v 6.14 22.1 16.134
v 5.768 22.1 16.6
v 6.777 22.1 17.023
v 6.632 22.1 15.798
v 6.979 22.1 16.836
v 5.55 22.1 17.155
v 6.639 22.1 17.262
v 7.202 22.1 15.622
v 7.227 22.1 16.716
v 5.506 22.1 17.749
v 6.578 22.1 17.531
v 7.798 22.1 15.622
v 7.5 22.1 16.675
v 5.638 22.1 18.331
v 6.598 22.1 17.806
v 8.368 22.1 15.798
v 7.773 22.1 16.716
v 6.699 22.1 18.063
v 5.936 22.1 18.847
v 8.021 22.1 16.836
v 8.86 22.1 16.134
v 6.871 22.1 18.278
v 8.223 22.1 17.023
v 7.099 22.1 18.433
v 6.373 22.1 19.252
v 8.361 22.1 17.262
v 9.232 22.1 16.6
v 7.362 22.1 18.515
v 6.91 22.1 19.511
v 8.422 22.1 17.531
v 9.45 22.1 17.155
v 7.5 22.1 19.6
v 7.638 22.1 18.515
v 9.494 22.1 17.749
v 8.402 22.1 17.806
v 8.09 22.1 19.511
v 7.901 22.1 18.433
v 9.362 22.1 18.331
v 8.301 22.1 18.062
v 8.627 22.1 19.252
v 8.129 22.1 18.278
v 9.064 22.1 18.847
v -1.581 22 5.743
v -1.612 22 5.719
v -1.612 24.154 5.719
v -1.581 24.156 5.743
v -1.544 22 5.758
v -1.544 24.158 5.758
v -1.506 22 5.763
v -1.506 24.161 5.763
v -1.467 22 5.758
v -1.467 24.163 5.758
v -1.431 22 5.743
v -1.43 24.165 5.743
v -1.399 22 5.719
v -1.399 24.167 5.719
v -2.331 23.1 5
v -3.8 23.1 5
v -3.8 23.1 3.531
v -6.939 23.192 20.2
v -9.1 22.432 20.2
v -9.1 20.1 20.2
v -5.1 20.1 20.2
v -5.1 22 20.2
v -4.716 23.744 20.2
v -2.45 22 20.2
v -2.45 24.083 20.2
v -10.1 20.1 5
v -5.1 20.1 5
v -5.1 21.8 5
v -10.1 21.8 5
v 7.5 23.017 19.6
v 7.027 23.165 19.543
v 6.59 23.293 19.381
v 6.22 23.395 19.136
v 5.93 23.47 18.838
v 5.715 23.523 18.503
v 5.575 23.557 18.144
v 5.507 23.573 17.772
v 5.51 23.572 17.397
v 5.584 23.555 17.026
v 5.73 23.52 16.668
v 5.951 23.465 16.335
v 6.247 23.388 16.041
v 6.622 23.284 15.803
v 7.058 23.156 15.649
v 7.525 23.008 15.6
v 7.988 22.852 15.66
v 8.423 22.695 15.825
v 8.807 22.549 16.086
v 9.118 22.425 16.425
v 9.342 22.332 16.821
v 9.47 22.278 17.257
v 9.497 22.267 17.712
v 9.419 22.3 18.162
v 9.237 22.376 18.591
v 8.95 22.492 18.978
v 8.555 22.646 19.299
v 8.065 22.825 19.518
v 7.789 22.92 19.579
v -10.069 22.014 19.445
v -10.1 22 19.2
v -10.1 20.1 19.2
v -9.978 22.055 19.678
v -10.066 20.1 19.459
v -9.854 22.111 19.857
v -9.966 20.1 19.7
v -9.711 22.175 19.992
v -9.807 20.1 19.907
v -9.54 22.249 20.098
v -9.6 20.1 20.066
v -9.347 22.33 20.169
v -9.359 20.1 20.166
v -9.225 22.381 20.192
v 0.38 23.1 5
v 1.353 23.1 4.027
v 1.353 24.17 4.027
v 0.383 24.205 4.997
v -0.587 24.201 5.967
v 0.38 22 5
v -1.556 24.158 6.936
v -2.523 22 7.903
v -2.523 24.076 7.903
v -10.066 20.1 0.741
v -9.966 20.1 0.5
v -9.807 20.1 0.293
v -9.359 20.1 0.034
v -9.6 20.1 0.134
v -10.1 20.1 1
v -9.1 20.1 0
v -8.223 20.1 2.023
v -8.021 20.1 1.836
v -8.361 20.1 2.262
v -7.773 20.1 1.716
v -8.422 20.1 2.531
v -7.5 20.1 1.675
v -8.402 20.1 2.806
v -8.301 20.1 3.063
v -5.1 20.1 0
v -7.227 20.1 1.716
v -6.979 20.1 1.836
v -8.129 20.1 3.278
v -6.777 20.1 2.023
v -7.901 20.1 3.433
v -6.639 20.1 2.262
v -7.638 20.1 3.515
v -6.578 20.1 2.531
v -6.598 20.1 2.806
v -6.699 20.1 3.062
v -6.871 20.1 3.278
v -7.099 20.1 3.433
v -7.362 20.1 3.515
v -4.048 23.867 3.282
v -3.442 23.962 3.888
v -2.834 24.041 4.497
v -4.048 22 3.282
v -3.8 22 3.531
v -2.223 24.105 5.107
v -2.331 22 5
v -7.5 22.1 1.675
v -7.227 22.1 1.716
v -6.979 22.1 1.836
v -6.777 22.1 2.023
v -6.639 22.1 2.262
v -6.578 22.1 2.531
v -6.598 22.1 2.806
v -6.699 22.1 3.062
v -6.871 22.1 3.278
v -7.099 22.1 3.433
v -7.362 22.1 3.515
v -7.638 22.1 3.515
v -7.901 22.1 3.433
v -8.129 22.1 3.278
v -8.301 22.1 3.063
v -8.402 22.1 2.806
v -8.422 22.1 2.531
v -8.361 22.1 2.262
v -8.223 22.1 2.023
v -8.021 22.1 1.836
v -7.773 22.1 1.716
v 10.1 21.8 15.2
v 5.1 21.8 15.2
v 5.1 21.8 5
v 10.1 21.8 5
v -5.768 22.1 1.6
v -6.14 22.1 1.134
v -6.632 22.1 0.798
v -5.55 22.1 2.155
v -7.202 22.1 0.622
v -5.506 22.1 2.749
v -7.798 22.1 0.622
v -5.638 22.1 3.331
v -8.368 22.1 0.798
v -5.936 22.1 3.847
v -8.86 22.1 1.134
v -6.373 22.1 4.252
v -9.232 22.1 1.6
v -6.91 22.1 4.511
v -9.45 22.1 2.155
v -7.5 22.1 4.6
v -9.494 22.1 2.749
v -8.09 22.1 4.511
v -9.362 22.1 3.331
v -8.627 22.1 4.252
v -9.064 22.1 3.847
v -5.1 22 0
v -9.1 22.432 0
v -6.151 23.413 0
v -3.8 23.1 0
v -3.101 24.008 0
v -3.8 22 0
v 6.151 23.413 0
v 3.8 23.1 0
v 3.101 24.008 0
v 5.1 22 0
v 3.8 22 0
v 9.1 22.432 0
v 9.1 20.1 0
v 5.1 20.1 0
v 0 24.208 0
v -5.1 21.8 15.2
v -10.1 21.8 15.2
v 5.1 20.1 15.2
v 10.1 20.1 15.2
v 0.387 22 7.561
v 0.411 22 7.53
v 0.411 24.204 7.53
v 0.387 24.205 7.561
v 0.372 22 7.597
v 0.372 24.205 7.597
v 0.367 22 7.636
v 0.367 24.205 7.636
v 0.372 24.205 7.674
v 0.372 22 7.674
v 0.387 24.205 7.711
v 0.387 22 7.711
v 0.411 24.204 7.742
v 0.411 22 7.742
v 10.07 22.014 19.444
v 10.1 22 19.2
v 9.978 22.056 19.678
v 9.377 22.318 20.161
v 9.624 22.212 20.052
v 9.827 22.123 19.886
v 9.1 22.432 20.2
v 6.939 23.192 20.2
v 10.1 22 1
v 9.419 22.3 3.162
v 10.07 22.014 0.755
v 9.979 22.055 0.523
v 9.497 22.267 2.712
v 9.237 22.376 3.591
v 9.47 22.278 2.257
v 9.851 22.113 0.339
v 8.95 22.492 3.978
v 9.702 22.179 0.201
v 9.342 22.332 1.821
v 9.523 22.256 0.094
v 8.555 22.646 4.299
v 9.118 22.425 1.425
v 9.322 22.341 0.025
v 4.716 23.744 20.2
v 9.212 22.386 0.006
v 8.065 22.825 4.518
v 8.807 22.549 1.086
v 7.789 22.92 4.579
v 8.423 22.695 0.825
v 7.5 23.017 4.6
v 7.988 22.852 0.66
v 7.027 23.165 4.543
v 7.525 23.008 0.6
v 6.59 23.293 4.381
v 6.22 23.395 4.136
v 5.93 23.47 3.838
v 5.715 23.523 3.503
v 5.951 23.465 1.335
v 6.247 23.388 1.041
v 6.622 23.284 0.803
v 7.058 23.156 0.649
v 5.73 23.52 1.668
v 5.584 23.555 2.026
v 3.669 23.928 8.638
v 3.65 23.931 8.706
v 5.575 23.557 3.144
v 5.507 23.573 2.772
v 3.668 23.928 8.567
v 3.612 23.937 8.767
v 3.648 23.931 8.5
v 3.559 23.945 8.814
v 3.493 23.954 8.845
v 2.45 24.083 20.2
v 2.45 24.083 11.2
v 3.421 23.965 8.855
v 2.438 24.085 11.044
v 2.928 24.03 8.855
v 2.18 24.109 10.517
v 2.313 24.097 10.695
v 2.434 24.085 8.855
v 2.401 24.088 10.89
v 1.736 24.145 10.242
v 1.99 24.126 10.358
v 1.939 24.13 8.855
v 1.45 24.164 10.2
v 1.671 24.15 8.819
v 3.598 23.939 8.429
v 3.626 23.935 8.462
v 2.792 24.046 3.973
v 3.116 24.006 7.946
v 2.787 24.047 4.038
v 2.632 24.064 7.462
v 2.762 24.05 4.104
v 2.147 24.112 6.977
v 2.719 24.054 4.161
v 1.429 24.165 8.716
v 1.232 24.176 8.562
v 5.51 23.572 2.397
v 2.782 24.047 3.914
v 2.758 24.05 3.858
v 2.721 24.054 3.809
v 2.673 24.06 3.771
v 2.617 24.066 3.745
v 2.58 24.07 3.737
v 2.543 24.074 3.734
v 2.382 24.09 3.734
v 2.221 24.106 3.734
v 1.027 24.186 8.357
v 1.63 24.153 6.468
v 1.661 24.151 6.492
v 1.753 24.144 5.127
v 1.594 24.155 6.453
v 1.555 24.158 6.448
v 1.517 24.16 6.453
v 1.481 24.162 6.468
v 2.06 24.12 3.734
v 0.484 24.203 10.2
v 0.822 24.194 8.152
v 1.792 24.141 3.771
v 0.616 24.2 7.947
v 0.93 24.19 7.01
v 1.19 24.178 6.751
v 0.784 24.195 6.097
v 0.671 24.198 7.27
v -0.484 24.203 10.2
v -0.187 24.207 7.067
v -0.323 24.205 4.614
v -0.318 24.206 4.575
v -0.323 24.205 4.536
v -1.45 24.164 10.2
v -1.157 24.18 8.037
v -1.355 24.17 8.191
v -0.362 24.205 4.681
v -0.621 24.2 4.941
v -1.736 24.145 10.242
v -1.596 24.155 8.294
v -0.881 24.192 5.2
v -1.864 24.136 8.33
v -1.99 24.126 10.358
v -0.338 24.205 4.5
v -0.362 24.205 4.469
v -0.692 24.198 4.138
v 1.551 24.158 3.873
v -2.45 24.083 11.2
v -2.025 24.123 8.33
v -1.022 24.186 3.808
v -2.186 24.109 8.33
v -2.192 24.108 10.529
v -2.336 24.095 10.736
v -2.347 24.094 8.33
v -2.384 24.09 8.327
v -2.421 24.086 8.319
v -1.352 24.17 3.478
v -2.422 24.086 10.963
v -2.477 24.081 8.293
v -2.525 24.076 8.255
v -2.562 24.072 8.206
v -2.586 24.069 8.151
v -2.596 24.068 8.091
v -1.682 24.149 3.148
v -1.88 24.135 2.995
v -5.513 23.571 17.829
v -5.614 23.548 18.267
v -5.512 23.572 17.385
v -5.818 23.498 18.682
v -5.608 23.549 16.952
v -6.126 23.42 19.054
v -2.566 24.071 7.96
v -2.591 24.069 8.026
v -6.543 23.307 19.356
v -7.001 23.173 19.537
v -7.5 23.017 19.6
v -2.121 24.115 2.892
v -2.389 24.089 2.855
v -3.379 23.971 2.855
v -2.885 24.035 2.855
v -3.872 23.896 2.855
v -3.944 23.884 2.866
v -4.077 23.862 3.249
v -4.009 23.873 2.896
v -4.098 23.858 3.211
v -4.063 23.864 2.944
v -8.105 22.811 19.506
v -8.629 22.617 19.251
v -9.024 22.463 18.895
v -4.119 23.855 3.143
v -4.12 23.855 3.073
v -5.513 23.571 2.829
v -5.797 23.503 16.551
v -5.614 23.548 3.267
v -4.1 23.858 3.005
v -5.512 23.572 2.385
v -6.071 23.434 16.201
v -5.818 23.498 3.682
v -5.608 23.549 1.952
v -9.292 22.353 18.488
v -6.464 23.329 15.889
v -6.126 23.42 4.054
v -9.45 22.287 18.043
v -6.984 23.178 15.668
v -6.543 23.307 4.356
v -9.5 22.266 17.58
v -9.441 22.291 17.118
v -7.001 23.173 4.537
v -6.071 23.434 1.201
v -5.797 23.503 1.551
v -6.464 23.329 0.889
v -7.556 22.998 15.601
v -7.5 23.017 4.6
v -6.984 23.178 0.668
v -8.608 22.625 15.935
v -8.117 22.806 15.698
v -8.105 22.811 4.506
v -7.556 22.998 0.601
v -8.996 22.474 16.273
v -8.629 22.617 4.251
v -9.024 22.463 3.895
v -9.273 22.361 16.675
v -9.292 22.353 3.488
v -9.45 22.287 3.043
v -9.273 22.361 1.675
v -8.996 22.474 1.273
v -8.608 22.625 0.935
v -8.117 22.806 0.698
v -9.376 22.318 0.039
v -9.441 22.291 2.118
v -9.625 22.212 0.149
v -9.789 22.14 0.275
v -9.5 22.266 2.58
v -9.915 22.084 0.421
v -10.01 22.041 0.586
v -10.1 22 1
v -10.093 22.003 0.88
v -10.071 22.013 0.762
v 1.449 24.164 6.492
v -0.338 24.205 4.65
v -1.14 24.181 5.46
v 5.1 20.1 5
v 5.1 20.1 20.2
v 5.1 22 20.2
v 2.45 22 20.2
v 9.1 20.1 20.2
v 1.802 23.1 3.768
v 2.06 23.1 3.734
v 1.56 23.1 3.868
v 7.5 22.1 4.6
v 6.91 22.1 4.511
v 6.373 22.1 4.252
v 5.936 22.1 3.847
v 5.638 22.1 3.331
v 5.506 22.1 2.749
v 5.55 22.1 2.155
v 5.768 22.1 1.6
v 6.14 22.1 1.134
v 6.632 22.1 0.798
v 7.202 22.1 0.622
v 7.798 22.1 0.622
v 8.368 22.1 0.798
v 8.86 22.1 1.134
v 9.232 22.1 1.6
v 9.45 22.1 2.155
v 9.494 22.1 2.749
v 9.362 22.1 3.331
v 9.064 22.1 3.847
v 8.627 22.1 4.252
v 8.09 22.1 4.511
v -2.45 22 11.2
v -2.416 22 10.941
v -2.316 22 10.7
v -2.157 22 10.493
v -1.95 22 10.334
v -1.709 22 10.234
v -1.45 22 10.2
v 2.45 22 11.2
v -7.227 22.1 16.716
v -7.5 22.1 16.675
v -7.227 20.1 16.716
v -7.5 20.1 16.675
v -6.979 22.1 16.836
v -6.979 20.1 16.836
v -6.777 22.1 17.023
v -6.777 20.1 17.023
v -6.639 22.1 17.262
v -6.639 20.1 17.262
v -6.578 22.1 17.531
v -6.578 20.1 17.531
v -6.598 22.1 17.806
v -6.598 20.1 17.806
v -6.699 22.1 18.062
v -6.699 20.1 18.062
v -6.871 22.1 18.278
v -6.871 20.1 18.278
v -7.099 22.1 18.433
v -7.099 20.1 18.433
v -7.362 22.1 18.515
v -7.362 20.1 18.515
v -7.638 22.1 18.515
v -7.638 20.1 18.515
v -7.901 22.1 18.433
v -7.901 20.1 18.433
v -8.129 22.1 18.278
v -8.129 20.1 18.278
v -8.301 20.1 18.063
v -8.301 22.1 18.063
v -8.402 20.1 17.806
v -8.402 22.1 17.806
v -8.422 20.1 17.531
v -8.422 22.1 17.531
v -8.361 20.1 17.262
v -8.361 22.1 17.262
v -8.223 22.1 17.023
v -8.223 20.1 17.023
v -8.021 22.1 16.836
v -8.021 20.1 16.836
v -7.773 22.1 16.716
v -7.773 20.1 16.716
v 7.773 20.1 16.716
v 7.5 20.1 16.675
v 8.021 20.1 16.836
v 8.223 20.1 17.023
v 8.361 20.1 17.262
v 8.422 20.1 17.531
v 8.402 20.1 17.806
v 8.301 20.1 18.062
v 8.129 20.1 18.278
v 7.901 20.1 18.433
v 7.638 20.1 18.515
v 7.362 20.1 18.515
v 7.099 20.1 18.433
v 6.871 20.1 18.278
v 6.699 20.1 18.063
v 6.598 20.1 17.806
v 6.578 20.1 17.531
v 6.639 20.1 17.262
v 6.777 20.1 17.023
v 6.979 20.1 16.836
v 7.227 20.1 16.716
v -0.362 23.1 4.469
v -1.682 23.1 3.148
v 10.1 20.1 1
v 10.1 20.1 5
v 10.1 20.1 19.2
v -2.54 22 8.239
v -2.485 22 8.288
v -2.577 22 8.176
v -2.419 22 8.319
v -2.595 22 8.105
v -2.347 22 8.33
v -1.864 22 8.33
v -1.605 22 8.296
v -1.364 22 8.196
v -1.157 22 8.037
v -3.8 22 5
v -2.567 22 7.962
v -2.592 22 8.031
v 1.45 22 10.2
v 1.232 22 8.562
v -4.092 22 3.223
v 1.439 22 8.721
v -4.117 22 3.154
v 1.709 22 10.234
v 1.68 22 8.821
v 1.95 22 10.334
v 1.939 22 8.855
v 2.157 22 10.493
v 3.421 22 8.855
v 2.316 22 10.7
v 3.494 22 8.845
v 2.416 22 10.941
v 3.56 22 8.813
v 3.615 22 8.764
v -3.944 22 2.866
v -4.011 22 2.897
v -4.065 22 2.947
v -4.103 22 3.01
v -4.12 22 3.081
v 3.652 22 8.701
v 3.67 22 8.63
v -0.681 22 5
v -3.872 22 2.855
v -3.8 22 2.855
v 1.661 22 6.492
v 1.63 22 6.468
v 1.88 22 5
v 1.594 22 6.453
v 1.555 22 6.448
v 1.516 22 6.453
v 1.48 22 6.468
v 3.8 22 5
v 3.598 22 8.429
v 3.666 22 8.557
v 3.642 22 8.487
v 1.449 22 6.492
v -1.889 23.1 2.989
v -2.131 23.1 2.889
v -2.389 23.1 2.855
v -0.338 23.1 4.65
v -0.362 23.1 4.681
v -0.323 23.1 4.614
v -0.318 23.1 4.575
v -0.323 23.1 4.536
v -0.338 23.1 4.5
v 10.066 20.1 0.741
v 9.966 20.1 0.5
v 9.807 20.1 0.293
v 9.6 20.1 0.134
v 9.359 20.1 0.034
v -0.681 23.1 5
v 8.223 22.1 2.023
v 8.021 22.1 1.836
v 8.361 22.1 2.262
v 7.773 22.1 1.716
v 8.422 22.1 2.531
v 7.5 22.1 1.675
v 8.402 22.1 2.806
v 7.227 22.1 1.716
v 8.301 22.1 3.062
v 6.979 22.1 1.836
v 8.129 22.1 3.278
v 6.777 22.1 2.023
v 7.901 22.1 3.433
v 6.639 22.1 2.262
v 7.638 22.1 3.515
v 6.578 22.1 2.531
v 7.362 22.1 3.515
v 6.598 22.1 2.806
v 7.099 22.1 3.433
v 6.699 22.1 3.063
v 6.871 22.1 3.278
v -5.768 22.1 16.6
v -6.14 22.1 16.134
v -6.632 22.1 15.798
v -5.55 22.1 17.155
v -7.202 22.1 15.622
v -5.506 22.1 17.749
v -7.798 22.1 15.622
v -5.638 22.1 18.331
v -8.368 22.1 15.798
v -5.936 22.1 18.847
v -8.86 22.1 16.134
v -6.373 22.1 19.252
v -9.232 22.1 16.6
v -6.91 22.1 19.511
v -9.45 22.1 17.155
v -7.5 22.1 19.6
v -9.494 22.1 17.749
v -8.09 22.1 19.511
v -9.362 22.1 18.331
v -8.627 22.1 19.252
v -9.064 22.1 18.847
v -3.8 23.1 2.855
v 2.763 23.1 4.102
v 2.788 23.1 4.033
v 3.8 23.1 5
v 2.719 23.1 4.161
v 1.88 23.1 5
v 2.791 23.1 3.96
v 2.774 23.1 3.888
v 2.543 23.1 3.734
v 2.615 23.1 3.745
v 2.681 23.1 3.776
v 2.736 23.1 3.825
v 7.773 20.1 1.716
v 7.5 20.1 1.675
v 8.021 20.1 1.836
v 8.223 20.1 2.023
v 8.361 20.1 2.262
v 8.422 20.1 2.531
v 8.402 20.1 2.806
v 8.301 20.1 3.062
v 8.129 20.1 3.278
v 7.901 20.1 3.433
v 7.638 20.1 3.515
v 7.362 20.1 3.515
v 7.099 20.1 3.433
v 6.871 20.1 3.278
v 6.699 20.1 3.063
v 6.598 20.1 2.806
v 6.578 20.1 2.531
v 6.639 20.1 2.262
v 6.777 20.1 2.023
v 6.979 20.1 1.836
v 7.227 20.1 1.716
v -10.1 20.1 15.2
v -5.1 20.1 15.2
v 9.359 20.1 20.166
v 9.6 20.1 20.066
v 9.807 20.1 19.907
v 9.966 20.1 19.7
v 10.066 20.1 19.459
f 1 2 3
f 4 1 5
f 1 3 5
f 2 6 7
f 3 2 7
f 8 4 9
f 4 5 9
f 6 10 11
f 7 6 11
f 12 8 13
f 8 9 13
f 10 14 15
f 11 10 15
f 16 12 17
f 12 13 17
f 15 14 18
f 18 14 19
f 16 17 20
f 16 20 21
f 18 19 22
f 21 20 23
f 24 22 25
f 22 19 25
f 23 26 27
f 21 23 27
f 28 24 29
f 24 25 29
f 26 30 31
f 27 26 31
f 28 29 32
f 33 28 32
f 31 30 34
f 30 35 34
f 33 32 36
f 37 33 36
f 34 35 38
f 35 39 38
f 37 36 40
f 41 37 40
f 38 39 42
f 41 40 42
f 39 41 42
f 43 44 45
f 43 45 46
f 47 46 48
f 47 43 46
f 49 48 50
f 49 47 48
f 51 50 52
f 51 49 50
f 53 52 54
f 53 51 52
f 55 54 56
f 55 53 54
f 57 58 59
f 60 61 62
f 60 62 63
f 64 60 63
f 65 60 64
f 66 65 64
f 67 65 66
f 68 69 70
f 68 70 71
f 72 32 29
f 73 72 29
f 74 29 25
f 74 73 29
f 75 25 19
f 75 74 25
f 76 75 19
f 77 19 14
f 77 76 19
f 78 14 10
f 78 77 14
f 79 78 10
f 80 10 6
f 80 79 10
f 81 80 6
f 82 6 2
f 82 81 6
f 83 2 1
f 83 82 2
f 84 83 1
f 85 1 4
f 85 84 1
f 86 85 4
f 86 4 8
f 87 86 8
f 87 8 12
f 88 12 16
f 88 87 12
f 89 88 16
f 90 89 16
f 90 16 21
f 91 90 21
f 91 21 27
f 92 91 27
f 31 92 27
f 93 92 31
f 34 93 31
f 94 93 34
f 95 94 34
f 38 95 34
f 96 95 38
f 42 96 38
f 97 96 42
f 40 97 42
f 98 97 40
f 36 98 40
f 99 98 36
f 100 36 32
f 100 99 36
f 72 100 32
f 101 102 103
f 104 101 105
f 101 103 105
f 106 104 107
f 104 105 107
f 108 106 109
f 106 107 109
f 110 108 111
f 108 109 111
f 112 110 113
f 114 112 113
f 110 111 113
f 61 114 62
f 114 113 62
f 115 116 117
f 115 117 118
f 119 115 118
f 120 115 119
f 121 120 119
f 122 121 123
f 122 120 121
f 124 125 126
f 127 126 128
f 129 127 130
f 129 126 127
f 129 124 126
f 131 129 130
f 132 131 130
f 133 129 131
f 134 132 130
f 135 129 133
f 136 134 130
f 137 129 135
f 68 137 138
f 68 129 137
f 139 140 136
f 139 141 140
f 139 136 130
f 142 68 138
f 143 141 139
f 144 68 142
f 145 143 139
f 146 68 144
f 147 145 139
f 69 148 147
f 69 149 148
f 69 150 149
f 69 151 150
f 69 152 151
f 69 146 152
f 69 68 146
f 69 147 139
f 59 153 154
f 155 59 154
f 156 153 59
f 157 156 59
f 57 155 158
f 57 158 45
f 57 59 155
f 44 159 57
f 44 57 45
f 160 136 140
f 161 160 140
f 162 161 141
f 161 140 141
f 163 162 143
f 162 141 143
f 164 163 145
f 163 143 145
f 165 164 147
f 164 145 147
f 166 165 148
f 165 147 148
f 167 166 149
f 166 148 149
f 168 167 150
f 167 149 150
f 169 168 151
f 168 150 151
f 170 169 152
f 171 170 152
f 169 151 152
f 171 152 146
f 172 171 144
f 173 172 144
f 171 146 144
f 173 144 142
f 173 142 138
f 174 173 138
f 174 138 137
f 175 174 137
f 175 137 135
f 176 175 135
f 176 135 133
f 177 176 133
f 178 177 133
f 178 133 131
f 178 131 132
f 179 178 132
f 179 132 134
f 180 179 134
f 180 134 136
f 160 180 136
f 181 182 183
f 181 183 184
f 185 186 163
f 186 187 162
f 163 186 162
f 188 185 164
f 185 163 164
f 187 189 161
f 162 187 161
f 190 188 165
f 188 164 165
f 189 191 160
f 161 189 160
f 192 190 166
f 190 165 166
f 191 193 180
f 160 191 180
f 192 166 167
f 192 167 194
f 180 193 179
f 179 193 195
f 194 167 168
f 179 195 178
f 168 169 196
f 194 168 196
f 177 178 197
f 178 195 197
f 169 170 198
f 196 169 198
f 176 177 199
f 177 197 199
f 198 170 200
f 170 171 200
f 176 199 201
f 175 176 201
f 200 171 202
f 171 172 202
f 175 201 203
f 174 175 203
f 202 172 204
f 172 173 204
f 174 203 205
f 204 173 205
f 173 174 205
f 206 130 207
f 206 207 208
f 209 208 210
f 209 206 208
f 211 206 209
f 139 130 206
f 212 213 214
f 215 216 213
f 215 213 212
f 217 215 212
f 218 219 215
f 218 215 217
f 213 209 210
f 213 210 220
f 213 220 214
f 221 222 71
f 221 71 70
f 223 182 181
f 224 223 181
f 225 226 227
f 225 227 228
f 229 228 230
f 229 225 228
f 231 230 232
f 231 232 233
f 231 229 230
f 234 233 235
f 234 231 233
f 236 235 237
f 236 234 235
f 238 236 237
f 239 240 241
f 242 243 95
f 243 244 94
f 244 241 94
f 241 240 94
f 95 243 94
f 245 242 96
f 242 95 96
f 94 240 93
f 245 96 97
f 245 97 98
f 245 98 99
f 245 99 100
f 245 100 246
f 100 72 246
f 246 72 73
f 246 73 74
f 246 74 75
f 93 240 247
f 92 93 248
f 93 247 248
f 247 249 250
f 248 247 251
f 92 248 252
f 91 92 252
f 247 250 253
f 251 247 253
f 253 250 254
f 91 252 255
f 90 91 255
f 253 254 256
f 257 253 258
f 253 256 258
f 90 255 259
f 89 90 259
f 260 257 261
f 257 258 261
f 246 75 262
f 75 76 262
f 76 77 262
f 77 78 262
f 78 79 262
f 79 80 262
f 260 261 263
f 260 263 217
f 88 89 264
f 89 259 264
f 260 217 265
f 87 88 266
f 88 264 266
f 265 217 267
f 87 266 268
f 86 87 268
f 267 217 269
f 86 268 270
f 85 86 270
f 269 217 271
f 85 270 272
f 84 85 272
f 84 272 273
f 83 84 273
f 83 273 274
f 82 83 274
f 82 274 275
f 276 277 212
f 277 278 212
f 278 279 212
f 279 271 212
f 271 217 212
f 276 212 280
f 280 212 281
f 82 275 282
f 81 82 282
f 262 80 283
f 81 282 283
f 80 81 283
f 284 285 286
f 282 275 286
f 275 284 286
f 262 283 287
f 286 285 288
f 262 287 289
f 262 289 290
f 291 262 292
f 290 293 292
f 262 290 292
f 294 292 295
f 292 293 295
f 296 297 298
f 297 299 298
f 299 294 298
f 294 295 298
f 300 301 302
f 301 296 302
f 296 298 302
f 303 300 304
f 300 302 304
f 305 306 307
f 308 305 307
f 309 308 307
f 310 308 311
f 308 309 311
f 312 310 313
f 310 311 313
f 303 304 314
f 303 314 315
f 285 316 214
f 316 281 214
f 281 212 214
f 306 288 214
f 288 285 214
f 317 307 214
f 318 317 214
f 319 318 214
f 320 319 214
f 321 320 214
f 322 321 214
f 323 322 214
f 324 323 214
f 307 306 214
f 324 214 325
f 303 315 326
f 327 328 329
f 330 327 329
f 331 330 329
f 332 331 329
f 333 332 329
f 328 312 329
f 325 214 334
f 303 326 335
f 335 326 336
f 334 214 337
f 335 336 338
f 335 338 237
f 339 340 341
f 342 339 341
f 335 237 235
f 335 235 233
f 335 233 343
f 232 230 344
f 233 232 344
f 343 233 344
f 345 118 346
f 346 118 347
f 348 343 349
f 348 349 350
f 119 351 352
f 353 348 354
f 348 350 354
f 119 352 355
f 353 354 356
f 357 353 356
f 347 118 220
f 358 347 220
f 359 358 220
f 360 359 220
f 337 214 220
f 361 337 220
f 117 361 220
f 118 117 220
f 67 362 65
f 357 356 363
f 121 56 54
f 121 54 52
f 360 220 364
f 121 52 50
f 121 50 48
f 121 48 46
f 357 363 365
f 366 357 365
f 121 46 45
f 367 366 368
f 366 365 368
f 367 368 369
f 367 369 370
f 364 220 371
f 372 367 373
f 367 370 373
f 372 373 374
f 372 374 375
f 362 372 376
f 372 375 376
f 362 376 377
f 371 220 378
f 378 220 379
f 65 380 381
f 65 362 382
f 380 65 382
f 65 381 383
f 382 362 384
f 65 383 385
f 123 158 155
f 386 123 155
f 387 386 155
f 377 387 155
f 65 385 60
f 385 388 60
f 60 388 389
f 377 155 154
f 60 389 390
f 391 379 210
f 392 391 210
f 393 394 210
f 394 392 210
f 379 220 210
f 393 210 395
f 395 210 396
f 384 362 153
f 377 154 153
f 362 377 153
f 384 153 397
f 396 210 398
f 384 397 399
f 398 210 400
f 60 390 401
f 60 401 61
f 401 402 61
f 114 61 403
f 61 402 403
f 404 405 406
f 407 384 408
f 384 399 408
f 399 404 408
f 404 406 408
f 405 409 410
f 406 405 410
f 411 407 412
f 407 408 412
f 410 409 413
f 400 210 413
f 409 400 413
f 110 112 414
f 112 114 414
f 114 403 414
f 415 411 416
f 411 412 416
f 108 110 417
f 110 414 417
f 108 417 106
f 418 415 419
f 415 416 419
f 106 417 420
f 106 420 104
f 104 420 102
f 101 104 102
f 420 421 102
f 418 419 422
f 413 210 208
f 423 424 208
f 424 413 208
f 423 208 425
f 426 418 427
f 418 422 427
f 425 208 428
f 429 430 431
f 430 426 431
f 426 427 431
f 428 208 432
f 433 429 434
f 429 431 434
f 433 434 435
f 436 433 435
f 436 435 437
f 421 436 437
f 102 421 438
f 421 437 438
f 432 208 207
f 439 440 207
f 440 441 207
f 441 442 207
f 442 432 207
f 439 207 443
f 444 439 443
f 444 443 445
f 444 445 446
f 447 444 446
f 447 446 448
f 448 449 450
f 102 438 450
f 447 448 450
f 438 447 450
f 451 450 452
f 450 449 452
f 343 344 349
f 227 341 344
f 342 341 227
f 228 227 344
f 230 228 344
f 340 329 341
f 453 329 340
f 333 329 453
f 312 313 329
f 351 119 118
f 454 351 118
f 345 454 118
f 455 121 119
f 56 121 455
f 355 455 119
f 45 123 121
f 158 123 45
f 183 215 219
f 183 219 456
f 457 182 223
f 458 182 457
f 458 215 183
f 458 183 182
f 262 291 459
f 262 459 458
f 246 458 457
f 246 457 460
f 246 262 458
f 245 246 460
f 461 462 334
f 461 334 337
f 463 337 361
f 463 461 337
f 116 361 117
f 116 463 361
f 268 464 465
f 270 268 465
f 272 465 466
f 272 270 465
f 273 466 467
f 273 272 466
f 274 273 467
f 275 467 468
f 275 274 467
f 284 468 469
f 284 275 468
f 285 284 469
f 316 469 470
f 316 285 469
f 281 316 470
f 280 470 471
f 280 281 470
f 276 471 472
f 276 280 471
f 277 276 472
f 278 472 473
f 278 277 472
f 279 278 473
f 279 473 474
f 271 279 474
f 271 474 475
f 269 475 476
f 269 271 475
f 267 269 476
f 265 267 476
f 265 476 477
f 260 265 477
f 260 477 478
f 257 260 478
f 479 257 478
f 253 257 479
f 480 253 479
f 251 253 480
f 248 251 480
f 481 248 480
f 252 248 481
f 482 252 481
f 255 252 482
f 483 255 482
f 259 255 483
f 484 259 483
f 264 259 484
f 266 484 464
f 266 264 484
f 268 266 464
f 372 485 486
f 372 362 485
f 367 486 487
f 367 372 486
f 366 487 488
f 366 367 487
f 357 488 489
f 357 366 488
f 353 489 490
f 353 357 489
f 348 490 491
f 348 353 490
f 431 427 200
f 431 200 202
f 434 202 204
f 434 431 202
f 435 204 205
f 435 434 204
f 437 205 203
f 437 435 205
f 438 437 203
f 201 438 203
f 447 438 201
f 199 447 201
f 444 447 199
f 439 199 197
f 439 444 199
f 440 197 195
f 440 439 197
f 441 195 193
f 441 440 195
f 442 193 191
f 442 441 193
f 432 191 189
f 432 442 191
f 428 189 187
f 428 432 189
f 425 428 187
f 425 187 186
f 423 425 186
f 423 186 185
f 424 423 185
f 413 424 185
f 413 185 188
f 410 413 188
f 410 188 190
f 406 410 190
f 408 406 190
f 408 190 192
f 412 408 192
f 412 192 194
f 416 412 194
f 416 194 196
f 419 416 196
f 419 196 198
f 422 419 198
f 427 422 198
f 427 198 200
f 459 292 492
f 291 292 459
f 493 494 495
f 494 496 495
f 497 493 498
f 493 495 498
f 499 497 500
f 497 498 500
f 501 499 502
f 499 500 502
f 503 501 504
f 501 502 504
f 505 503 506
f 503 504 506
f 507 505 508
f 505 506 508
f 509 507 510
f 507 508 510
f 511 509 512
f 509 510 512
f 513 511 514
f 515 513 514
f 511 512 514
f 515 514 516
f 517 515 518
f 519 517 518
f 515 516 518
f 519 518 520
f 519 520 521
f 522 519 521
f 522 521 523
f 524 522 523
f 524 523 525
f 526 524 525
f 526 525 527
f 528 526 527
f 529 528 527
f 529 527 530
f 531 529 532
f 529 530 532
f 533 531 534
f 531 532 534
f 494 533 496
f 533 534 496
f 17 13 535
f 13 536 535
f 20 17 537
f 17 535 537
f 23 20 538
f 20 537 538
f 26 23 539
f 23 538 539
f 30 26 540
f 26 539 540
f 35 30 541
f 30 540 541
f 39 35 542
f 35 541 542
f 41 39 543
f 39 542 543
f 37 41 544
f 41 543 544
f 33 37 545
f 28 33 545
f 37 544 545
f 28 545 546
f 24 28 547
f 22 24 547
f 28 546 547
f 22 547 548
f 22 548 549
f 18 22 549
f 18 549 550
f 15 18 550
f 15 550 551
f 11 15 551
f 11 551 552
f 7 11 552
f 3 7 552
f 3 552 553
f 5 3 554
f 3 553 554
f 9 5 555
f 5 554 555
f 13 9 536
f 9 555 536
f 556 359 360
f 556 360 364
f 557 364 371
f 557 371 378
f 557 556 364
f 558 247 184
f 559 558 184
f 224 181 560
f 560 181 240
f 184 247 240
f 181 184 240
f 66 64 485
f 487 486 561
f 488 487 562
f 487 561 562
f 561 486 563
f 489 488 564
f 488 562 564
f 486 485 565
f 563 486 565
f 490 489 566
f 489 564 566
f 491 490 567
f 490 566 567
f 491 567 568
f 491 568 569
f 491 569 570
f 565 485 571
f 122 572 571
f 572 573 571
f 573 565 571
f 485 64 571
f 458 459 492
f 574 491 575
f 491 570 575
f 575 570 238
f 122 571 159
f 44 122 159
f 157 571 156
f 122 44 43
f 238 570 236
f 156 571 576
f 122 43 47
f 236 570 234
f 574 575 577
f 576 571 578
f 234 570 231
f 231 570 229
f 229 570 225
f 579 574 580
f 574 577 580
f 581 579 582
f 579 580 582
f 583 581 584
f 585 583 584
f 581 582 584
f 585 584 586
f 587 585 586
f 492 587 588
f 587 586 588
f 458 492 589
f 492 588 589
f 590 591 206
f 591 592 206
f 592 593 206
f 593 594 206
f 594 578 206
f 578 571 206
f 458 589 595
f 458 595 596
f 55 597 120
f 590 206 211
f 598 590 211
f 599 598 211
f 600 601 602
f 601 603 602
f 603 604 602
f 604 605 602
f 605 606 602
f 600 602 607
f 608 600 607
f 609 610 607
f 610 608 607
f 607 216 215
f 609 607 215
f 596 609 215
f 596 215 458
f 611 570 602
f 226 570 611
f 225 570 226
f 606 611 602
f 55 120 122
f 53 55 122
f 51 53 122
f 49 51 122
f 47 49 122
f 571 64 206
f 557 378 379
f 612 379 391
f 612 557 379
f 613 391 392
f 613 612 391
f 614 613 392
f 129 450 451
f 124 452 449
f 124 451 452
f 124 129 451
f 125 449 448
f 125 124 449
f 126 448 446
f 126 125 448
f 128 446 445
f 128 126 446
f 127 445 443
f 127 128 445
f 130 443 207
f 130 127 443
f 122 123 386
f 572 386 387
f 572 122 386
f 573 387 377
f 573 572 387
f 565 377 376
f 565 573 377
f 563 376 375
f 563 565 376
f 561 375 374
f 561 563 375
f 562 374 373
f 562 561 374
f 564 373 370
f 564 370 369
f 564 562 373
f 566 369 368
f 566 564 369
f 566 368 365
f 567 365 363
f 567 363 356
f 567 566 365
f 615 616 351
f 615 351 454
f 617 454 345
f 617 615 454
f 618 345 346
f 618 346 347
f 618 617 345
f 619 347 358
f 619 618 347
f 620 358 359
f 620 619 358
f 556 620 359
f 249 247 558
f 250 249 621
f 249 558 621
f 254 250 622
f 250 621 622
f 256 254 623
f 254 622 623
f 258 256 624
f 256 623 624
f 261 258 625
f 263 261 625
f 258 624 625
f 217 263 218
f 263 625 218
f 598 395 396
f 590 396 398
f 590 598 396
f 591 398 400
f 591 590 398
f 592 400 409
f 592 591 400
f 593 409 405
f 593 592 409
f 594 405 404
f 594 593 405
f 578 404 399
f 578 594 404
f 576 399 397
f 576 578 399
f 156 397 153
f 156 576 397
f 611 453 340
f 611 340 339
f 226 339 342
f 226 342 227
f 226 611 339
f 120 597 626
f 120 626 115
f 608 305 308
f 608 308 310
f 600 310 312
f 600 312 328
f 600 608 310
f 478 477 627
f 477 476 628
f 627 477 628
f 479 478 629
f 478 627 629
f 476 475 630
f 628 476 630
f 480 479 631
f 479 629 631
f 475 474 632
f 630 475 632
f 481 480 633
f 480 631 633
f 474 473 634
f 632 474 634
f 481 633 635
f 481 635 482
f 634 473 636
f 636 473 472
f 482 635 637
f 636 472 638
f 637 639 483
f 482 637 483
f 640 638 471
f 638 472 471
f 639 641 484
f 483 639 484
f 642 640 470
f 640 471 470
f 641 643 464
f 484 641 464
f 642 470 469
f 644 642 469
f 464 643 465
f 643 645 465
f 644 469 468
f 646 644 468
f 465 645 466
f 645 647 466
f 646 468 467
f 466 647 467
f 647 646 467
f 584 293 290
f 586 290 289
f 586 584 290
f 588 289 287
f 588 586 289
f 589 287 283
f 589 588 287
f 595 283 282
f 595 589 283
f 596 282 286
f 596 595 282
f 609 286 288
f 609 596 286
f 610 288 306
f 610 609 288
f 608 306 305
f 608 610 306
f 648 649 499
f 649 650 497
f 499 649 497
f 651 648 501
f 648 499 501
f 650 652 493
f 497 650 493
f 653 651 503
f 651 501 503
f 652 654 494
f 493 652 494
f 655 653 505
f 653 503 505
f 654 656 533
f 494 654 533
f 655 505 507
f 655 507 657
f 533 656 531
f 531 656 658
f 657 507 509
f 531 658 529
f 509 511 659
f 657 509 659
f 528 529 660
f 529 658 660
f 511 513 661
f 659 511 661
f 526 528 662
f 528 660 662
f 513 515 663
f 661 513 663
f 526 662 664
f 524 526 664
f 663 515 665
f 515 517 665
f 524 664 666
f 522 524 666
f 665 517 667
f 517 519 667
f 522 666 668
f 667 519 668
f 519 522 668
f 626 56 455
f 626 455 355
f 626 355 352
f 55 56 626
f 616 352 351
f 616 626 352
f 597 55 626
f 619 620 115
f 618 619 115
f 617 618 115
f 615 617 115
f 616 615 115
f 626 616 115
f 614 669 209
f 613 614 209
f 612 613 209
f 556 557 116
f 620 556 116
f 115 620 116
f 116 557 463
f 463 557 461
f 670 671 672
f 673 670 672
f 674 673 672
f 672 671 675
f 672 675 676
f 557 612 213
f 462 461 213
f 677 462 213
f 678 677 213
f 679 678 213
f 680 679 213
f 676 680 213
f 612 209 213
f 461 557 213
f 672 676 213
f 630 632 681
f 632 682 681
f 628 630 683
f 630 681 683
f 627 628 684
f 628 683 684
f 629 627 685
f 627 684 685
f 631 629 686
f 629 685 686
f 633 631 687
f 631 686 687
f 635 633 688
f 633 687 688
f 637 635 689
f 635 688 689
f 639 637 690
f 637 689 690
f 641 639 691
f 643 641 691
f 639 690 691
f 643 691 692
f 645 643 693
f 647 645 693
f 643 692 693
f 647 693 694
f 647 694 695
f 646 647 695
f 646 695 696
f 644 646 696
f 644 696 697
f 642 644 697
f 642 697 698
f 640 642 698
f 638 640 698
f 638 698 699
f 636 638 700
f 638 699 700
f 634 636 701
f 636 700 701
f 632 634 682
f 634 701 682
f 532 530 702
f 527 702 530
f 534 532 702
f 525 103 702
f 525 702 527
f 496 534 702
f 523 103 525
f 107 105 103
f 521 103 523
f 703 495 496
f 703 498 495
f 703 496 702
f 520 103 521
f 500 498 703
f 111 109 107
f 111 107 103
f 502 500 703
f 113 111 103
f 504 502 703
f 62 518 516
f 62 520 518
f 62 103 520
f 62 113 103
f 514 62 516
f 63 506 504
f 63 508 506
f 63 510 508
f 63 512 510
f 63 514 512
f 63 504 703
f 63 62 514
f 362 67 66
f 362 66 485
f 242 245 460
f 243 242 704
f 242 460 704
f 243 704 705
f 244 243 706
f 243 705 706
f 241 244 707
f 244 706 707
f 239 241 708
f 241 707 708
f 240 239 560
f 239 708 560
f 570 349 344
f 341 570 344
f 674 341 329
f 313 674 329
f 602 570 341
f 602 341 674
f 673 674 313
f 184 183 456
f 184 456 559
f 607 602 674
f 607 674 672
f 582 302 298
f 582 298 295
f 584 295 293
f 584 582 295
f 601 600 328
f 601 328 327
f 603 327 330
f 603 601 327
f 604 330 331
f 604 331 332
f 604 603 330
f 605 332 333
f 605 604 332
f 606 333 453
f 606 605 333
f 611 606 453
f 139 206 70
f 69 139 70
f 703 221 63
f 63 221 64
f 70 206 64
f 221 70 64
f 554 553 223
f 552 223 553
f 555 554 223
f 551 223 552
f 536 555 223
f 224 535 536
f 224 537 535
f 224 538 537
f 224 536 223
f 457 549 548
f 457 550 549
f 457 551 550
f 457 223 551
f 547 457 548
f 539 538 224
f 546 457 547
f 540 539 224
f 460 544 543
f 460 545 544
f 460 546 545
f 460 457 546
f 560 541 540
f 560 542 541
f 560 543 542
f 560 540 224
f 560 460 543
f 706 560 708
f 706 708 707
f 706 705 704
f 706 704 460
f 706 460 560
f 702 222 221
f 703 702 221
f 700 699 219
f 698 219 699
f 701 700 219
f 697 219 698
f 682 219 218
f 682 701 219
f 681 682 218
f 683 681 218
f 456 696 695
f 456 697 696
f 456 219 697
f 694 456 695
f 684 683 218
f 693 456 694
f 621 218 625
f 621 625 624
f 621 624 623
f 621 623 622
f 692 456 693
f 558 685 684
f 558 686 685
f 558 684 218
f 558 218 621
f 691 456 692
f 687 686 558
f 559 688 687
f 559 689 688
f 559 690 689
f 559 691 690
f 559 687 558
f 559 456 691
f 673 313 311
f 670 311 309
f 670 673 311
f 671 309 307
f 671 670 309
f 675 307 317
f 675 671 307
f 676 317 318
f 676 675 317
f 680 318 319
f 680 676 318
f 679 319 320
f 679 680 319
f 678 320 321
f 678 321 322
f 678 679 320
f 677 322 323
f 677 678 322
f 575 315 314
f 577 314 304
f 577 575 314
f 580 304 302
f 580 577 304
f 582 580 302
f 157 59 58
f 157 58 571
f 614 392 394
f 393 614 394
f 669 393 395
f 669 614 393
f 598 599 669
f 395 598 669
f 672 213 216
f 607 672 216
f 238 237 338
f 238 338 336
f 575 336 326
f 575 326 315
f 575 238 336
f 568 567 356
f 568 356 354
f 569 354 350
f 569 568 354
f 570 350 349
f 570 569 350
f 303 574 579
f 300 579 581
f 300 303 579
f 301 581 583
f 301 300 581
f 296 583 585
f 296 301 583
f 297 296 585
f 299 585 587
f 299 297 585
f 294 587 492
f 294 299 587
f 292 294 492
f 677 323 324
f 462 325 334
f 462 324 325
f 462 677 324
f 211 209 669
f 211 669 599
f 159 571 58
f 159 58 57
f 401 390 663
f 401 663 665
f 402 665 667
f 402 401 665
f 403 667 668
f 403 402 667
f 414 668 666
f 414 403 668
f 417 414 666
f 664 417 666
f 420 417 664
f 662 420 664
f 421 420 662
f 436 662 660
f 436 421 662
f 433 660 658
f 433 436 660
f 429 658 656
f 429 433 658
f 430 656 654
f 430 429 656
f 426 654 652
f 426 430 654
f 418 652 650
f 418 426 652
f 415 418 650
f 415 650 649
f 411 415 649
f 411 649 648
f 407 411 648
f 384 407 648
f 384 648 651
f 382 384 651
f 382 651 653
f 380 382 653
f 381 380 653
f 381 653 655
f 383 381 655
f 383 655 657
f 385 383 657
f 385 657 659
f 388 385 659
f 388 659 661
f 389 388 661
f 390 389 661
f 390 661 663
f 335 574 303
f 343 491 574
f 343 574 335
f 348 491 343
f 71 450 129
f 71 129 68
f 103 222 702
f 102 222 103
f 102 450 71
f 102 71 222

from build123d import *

# Parameters (mm, degrees)
EXTRUDE_1_DEPTH     = 20.2
SKETCH_4_W          = 4.5
SKETCH_4_H          = 1.2
CUT_EXTRUDE_1_DEPTH = 10
SKETCH_5_W          = 4.5
SKETCH_5_H          = 10
CUT_EXTRUDE_2_DEPTH = 10
SKETCH_6_W          = 5
SKETCH_6_H          = 5
EXTRUDE_2_DEPTH     = 1.4
SKETCH_7_W          = 7.6
SKETCH_7_H          = 2.5
CUT_EXTRUDE_3_DEPTH = 5
SKETCH_8_R          = 1
CUT_EXTRUDE_4_DEPTH = 5
SKETCH_9_R          = 2
CUT_EXTRUDE_5_DEPTH = 1.5
CUT_EXTRUDE_6_DEPTH = 5
CUT_EXTRUDE_7_DEPTH = 5
SKETCH_12_R         = 1
SKETCH_12_R_2       = 0.925
EXTRUDE_3_DEPTH     = 1.5
SKETCH_13_W         = 10
SKETCH_13_H         = 2.102852528
CUT_EXTRUDE_8_DEPTH = 0.2
SKETCH_14_W         = 10
SKETCH_14_H         = 2.102852528
CUT_EXTRUDE_9_DEPTH = 0.2
FILLET_2_R          = 1
EXTRUDE_START       = 0.5
SKETCH_15_R         = 0.925
EXTRUDE_4_DEPTH     = 0.5
SKETCH_16_W         = 5
SKETCH_16_H         = 10.2
EXTRUDE_5_DEPTH     = 0.2


with BuildPart() as part:
    # 草图3 → 凸台-拉伸1 (new body)
    with BuildSketch(Plane.XY):
        with BuildLine():
            Line((-10.1, 22), (10.1, 22))
            ThreePointArc((10.1, 22), (0, 24.207643421), (-10.1, 22))
        make_face()
    extrude(amount=EXTRUDE_1_DEPTH)

    # 草图4 → 切除-拉伸1 (cut)
    with BuildSketch(Plane(origin=(6.414908285, -11.03, 20.2), x_dir=(1, 0, 0), z_dir=(0, 0, 1))):
        with Locations((-6.414908285, 33.63)):
            Rectangle(SKETCH_4_W, SKETCH_4_H)
    extrude(amount=-CUT_EXTRUDE_1_DEPTH, mode=Mode.SUBTRACT)

    # 草图5 → 切除-拉伸2 (cut)
    with BuildSketch(Plane.XZ.offset(-23.2)):
        with Locations((0, 15.2)):
            Rectangle(SKETCH_5_W, SKETCH_5_H)
    extrude(amount=-CUT_EXTRUDE_2_DEPTH, mode=Mode.SUBTRACT)

    # 草图6 → 凸台-拉伸2 (add)
    with BuildSketch(Plane.XZ.offset(-22)):
        with Locations((-7.6, 17.7)):
            Rectangle(SKETCH_6_W, SKETCH_6_H)
        with Locations((-7.6, 2.5)):
            Rectangle(SKETCH_6_W, SKETCH_6_H)
        with Locations((7.6, 2.5)):
            Rectangle(SKETCH_6_W, SKETCH_6_H)
        with Locations((7.6, 17.7)):
            Rectangle(SKETCH_6_W, SKETCH_6_H)
    extrude(amount=EXTRUDE_2_DEPTH)

    # 草图7 → 切除-拉伸3 (cut)
    with BuildSketch(Plane(origin=(6.414908285, -11.03, 0), x_dir=(1, 0, 0), z_dir=(0, 0, -1))):
        with Locations((-6.414908285, -32.88)):
            Rectangle(SKETCH_7_W, SKETCH_7_H)
    extrude(amount=-CUT_EXTRUDE_3_DEPTH, mode=Mode.SUBTRACT)

    # 草图8 → 切除-拉伸4 (cut)
    with BuildSketch(Plane(origin=(6.414908285, 20.6, 10.797250082), x_dir=(-1, 0, 0), z_dir=(0, -1, 0))):
        with Locations(Location((13.914908285, -6.802749918, 0), (0, 0, 90))):
            Circle(SKETCH_8_R)
        with Locations(Location((-1.085091715, -6.802749918, 0), (0, 0, 90))):
            Circle(SKETCH_8_R)
        with Locations(Location((-1.085091715, 8.197250082, 0), (0, 0, 90))):
            Circle(SKETCH_8_R)
        with Locations(Location((13.914908285, 8.197250082, 0), (0, 0, 90))):
            Circle(SKETCH_8_R)
    extrude(amount=-CUT_EXTRUDE_4_DEPTH, mode=Mode.SUBTRACT)

    # 草图9 → 切除-拉伸5 (cut)
    with BuildSketch(Plane(origin=(0, 23.6, 0), x_dir=(-1, 0, 0), z_dir=(0, -1, 0))):
        with Locations(Location((7.5, -2.6, 0), (0, 0, 270))):
            Circle(SKETCH_9_R)
        with Locations(Location((-7.5, -2.6, 0), (0, 0, 270))):
            Circle(SKETCH_9_R)
        with Locations(Location((7.5, -17.6, 0), (0, 0, 270))):
            Circle(SKETCH_9_R)
        with Locations(Location((-7.5, -17.6, 0), (0, 0, 270))):
            Circle(SKETCH_9_R)
    extrude(amount=CUT_EXTRUDE_5_DEPTH, mode=Mode.SUBTRACT)

    # 草图10 → 切除-拉伸6 (cut)
    with BuildSketch(Plane(origin=(6.414908285, 22, 10.797250082), x_dir=(-1, 0, 0), z_dir=(0, -1, 0))):
        with BuildLine():
            Line((7.57208535, 2.759943394), (3.695561186, 6.636467557))
            ThreePointArc((3.695561186, 6.636467557), (3.641367999, 6.908915111), (3.872337882, 7.063244252))
            Line((3.872337882, 7.063244252), (4.354570929, 7.063244252))
            ThreePointArc((4.354570929, 7.063244252), (4.737254361, 6.987123785), (5.06167771, 6.770351034))
            Line((5.06167771, 6.770351034), (8.938201874, 2.89382687))
            ThreePointArc((8.938201874, 2.89382687), (8.992395061, 2.621379317), (8.761425178, 2.467050175))
            Line((8.761425178, 2.467050175), (8.279192131, 2.467050175))
            ThreePointArc((8.279192131, 2.467050175), (7.896508699, 2.543170642), (7.57208535, 2.759943394))
        make_face()
        with BuildLine():
            Line((4.965840766, 4.305527806), (6.003708732, 3.26765984))
            ThreePointArc((6.003708732, 3.26765984), (6.047642714, 3.161593823), (6.003708732, 3.055527806))
            Line((6.003708732, 3.055527806), (5.182998054, 2.234817128))
            ThreePointArc((5.182998054, 2.234817128), (4.858574705, 2.018044376), (4.475891272, 1.941923909))
            Line((4.475891272, 1.941923909), (2.993658225, 1.941923909))
            ThreePointArc((2.993658225, 1.941923909), (2.762688342, 2.096253051), (2.81688153, 2.368700604))
            Line((2.81688153, 2.368700604), (4.753708732, 4.305527806))
            ThreePointArc((4.753708732, 4.305527806), (4.859774749, 4.349461789), (4.965840766, 4.305527806))
        make_face()
        with BuildLine():
            Line((7.814368903, 5.078320012), (6.776500938, 6.116187978))
            ThreePointArc((6.776500938, 6.116187978), (6.732566955, 6.222253995), (6.776500938, 6.328320012))
            Line((6.776500938, 6.328320012), (8.097211616, 7.64903069))
            ThreePointArc((8.097211616, 7.64903069), (8.421634965, 7.865803441), (8.804318397, 7.941923909))
            Line((8.804318397, 7.941923909), (10.286551444, 7.941923909))
            ThreePointArc((10.286551444, 7.941923909), (10.517521327, 7.787594767), (10.463328139, 7.515147214))
            Line((10.463328139, 7.515147214), (8.026500938, 5.078320012))
            ThreePointArc((8.026500938, 5.078320012), (7.920434921, 5.034386029), (7.814368903, 5.078320012))
        make_face()
    extrude(amount=-CUT_EXTRUDE_6_DEPTH, mode=Mode.SUBTRACT)

    # 草图11 → 切除-拉伸7 (cut)
    with BuildSketch(Plane(origin=(6.414908285, 20.6, 10.797250082), x_dir=(-1, 0, 0), z_dir=(0, -1, 0))):
        with BuildLine():
            Line((16.514908285, -9.402749918), (16.514908285, -8.402749918))
            ThreePointArc((16.514908285, -8.402749918), (16.222015066, -9.109856699), (15.514908285, -9.402749918))
            Line((15.514908285, -9.402749918), (16.514908285, -9.402749918))
        make_face()
        with BuildLine():
            Line((-3.685091715, -9.402749918), (-2.685091715, -9.402749918))
            ThreePointArc((-2.685091715, -9.402749918), (-3.392198496, -9.109856699), (-3.685091715, -8.402749918))
            Line((-3.685091715, -8.402749918), (-3.685091715, -9.402749918))
        make_face()
        with BuildLine():
            Line((-3.685091715, 10.797250082), (-3.685091715, 9.797250082))
            ThreePointArc((-3.685091715, 9.797250082), (-3.392198496, 10.504356863), (-2.685091715, 10.797250082))
            Line((-2.685091715, 10.797250082), (-3.685091715, 10.797250082))
        make_face()
        with BuildLine():
            Line((16.514908285, 10.797250082), (15.514908285, 10.797250082))
            ThreePointArc((15.514908285, 10.797250082), (16.222015066, 10.504356863), (16.514908285, 9.797250082))
            Line((16.514908285, 9.797250082), (16.514908285, 10.797250082))
        make_face()
    extrude(amount=-CUT_EXTRUDE_7_DEPTH, mode=Mode.SUBTRACT)

    # 草图12 → 凸台-拉伸3 (add)
    # profile 1 of 4: a face of its own
    with BuildSketch(Plane.XZ.offset(-20.6)):
        with Locations((7.5, 17.6)):
            Circle(SKETCH_12_R)
        with Locations(Location((7.5, 17.6, 0), (0, 0, 270))):
            Circle(SKETCH_12_R_2, mode=Mode.SUBTRACT)
    # profile 2 of 4: a face of its own
    with BuildSketch(Plane.XZ.offset(-20.6)):
        with Locations((-7.5, 17.6)):
            Circle(SKETCH_12_R)
        with Locations(Location((-7.5, 17.6, 0), (0, 0, 270))):
            Circle(SKETCH_12_R_2, mode=Mode.SUBTRACT)
    # profile 3 of 4: a face of its own
    with BuildSketch(Plane.XZ.offset(-20.6)):
        with Locations((-7.5, 2.6)):
            Circle(SKETCH_12_R)
        with Locations(Location((-7.5, 2.6, 0), (0, 0, 270))):
            Circle(SKETCH_12_R_2, mode=Mode.SUBTRACT)
    # profile 4 of 4: a face of its own
    with BuildSketch(Plane.XZ.offset(-20.6)):
        with Locations((7.5, 2.6)):
            Circle(SKETCH_12_R)
        with Locations(Location((7.5, 2.6, 0), (0, 0, 270))):
            Circle(SKETCH_12_R_2, mode=Mode.SUBTRACT)
    extrude(amount=-EXTRUDE_3_DEPTH)

    # 草图13 → 切除-拉伸8 (cut)
    with BuildSketch(Plane.ZY.offset(-2.25)):
        with Locations((15.2, 23.051426264)):
            Rectangle(SKETCH_13_W, SKETCH_13_H)
    extrude(amount=-CUT_EXTRUDE_8_DEPTH, mode=Mode.SUBTRACT)

    # 草图14 → 切除-拉伸9 (cut)
    with BuildSketch(Plane(origin=(-2.25, 0, 0), x_dir=(0, 0, -1), z_dir=(1, 0, 0))):
        with Locations((-15.2, 23.051426264)):
            Rectangle(SKETCH_14_W, SKETCH_14_H)
    extrude(amount=-CUT_EXTRUDE_9_DEPTH, mode=Mode.SUBTRACT)

    # 圆角2
    fillet_2_edges = [part.edges().sort_by_distance(p)[0] for p in [
        (2.45, 23.041672434, 10.2),
        (-2.45, 23.041672434, 10.2),
    ]]
    fillet(fillet_2_edges, radius=FILLET_2_R)

    # 草图15 → 凸台-拉伸4 (add)
    # profile 1 of 4: a face of its own
    with BuildSketch(Plane.XZ.offset(-20.6).offset(EXTRUDE_START)):
        with BuildLine():
            Line((-10.1, 5), (-10.1, 1))
            ThreePointArc((-10.1, 1), (-9.807106781, 0.292893219), (-9.1, 0))
            Line((-9.1, 0), (-5.1, 0))
            Line((-5.1, 0), (-5.1, 5))
            Line((-5.1, 5), (-10.1, 5))
        make_face()
        with Locations(Location((-7.5, 2.6, 0), (0, 0, 270))):
            Circle(SKETCH_15_R, mode=Mode.SUBTRACT)
    # profile 2 of 4: a face of its own
    with BuildSketch(Plane.XZ.offset(-20.6).offset(EXTRUDE_START)):
        with BuildLine():
            Line((-10.1, 19.2), (-10.1, 15.2))
            Line((-10.1, 15.2), (-5.1, 15.2))
            Line((-5.1, 15.2), (-5.1, 20.2))
            Line((-5.1, 20.2), (-9.1, 20.2))
            ThreePointArc((-9.1, 20.2), (-9.807106781, 19.907106781), (-10.1, 19.2))
        make_face()
        with Locations(Location((-7.5, 17.6, 0), (0, 0, 270))):
            Circle(SKETCH_15_R, mode=Mode.SUBTRACT)
    # profile 3 of 4: a face of its own
    with BuildSketch(Plane.XZ.offset(-20.6).offset(EXTRUDE_START)):
        with BuildLine():
            Line((9.1, 20.2), (5.1, 20.2))
            Line((5.1, 20.2), (5.1, 15.2))
            Line((5.1, 15.2), (10.1, 15.2))
            Line((10.1, 15.2), (10.1, 19.2))
            ThreePointArc((10.1, 19.2), (9.807106781, 19.907106781), (9.1, 20.2))
        make_face()
        with Locations(Location((7.5, 17.6, 0), (0, 0, 270))):
            Circle(SKETCH_15_R, mode=Mode.SUBTRACT)
    # profile 4 of 4: a face of its own
    with BuildSketch(Plane.XZ.offset(-20.6).offset(EXTRUDE_START)):
        with BuildLine():
            Line((5.1, 0), (9.1, 0))
            ThreePointArc((9.1, 0), (9.807106781, 0.292893219), (10.1, 1))
            Line((10.1, 1), (10.1, 5))
            Line((10.1, 5), (5.1, 5))
            Line((5.1, 5), (5.1, 0))
        make_face()
        with Locations(Location((7.5, 2.6, 0), (0, 0, 270))):
            Circle(SKETCH_15_R, mode=Mode.SUBTRACT)
    extrude(amount=-EXTRUDE_4_DEPTH)

    # 草图16 → 凸台-拉伸5 (add)
    with BuildSketch(Plane.XZ.offset(-22)):
        with Locations((-7.6, 10.1)):
            Rectangle(SKETCH_16_W, SKETCH_16_H)
        with Locations((7.6, 10.1)):
            Rectangle(SKETCH_16_W, SKETCH_16_H)
    extrude(amount=EXTRUDE_5_DEPTH)


solid = part.part
